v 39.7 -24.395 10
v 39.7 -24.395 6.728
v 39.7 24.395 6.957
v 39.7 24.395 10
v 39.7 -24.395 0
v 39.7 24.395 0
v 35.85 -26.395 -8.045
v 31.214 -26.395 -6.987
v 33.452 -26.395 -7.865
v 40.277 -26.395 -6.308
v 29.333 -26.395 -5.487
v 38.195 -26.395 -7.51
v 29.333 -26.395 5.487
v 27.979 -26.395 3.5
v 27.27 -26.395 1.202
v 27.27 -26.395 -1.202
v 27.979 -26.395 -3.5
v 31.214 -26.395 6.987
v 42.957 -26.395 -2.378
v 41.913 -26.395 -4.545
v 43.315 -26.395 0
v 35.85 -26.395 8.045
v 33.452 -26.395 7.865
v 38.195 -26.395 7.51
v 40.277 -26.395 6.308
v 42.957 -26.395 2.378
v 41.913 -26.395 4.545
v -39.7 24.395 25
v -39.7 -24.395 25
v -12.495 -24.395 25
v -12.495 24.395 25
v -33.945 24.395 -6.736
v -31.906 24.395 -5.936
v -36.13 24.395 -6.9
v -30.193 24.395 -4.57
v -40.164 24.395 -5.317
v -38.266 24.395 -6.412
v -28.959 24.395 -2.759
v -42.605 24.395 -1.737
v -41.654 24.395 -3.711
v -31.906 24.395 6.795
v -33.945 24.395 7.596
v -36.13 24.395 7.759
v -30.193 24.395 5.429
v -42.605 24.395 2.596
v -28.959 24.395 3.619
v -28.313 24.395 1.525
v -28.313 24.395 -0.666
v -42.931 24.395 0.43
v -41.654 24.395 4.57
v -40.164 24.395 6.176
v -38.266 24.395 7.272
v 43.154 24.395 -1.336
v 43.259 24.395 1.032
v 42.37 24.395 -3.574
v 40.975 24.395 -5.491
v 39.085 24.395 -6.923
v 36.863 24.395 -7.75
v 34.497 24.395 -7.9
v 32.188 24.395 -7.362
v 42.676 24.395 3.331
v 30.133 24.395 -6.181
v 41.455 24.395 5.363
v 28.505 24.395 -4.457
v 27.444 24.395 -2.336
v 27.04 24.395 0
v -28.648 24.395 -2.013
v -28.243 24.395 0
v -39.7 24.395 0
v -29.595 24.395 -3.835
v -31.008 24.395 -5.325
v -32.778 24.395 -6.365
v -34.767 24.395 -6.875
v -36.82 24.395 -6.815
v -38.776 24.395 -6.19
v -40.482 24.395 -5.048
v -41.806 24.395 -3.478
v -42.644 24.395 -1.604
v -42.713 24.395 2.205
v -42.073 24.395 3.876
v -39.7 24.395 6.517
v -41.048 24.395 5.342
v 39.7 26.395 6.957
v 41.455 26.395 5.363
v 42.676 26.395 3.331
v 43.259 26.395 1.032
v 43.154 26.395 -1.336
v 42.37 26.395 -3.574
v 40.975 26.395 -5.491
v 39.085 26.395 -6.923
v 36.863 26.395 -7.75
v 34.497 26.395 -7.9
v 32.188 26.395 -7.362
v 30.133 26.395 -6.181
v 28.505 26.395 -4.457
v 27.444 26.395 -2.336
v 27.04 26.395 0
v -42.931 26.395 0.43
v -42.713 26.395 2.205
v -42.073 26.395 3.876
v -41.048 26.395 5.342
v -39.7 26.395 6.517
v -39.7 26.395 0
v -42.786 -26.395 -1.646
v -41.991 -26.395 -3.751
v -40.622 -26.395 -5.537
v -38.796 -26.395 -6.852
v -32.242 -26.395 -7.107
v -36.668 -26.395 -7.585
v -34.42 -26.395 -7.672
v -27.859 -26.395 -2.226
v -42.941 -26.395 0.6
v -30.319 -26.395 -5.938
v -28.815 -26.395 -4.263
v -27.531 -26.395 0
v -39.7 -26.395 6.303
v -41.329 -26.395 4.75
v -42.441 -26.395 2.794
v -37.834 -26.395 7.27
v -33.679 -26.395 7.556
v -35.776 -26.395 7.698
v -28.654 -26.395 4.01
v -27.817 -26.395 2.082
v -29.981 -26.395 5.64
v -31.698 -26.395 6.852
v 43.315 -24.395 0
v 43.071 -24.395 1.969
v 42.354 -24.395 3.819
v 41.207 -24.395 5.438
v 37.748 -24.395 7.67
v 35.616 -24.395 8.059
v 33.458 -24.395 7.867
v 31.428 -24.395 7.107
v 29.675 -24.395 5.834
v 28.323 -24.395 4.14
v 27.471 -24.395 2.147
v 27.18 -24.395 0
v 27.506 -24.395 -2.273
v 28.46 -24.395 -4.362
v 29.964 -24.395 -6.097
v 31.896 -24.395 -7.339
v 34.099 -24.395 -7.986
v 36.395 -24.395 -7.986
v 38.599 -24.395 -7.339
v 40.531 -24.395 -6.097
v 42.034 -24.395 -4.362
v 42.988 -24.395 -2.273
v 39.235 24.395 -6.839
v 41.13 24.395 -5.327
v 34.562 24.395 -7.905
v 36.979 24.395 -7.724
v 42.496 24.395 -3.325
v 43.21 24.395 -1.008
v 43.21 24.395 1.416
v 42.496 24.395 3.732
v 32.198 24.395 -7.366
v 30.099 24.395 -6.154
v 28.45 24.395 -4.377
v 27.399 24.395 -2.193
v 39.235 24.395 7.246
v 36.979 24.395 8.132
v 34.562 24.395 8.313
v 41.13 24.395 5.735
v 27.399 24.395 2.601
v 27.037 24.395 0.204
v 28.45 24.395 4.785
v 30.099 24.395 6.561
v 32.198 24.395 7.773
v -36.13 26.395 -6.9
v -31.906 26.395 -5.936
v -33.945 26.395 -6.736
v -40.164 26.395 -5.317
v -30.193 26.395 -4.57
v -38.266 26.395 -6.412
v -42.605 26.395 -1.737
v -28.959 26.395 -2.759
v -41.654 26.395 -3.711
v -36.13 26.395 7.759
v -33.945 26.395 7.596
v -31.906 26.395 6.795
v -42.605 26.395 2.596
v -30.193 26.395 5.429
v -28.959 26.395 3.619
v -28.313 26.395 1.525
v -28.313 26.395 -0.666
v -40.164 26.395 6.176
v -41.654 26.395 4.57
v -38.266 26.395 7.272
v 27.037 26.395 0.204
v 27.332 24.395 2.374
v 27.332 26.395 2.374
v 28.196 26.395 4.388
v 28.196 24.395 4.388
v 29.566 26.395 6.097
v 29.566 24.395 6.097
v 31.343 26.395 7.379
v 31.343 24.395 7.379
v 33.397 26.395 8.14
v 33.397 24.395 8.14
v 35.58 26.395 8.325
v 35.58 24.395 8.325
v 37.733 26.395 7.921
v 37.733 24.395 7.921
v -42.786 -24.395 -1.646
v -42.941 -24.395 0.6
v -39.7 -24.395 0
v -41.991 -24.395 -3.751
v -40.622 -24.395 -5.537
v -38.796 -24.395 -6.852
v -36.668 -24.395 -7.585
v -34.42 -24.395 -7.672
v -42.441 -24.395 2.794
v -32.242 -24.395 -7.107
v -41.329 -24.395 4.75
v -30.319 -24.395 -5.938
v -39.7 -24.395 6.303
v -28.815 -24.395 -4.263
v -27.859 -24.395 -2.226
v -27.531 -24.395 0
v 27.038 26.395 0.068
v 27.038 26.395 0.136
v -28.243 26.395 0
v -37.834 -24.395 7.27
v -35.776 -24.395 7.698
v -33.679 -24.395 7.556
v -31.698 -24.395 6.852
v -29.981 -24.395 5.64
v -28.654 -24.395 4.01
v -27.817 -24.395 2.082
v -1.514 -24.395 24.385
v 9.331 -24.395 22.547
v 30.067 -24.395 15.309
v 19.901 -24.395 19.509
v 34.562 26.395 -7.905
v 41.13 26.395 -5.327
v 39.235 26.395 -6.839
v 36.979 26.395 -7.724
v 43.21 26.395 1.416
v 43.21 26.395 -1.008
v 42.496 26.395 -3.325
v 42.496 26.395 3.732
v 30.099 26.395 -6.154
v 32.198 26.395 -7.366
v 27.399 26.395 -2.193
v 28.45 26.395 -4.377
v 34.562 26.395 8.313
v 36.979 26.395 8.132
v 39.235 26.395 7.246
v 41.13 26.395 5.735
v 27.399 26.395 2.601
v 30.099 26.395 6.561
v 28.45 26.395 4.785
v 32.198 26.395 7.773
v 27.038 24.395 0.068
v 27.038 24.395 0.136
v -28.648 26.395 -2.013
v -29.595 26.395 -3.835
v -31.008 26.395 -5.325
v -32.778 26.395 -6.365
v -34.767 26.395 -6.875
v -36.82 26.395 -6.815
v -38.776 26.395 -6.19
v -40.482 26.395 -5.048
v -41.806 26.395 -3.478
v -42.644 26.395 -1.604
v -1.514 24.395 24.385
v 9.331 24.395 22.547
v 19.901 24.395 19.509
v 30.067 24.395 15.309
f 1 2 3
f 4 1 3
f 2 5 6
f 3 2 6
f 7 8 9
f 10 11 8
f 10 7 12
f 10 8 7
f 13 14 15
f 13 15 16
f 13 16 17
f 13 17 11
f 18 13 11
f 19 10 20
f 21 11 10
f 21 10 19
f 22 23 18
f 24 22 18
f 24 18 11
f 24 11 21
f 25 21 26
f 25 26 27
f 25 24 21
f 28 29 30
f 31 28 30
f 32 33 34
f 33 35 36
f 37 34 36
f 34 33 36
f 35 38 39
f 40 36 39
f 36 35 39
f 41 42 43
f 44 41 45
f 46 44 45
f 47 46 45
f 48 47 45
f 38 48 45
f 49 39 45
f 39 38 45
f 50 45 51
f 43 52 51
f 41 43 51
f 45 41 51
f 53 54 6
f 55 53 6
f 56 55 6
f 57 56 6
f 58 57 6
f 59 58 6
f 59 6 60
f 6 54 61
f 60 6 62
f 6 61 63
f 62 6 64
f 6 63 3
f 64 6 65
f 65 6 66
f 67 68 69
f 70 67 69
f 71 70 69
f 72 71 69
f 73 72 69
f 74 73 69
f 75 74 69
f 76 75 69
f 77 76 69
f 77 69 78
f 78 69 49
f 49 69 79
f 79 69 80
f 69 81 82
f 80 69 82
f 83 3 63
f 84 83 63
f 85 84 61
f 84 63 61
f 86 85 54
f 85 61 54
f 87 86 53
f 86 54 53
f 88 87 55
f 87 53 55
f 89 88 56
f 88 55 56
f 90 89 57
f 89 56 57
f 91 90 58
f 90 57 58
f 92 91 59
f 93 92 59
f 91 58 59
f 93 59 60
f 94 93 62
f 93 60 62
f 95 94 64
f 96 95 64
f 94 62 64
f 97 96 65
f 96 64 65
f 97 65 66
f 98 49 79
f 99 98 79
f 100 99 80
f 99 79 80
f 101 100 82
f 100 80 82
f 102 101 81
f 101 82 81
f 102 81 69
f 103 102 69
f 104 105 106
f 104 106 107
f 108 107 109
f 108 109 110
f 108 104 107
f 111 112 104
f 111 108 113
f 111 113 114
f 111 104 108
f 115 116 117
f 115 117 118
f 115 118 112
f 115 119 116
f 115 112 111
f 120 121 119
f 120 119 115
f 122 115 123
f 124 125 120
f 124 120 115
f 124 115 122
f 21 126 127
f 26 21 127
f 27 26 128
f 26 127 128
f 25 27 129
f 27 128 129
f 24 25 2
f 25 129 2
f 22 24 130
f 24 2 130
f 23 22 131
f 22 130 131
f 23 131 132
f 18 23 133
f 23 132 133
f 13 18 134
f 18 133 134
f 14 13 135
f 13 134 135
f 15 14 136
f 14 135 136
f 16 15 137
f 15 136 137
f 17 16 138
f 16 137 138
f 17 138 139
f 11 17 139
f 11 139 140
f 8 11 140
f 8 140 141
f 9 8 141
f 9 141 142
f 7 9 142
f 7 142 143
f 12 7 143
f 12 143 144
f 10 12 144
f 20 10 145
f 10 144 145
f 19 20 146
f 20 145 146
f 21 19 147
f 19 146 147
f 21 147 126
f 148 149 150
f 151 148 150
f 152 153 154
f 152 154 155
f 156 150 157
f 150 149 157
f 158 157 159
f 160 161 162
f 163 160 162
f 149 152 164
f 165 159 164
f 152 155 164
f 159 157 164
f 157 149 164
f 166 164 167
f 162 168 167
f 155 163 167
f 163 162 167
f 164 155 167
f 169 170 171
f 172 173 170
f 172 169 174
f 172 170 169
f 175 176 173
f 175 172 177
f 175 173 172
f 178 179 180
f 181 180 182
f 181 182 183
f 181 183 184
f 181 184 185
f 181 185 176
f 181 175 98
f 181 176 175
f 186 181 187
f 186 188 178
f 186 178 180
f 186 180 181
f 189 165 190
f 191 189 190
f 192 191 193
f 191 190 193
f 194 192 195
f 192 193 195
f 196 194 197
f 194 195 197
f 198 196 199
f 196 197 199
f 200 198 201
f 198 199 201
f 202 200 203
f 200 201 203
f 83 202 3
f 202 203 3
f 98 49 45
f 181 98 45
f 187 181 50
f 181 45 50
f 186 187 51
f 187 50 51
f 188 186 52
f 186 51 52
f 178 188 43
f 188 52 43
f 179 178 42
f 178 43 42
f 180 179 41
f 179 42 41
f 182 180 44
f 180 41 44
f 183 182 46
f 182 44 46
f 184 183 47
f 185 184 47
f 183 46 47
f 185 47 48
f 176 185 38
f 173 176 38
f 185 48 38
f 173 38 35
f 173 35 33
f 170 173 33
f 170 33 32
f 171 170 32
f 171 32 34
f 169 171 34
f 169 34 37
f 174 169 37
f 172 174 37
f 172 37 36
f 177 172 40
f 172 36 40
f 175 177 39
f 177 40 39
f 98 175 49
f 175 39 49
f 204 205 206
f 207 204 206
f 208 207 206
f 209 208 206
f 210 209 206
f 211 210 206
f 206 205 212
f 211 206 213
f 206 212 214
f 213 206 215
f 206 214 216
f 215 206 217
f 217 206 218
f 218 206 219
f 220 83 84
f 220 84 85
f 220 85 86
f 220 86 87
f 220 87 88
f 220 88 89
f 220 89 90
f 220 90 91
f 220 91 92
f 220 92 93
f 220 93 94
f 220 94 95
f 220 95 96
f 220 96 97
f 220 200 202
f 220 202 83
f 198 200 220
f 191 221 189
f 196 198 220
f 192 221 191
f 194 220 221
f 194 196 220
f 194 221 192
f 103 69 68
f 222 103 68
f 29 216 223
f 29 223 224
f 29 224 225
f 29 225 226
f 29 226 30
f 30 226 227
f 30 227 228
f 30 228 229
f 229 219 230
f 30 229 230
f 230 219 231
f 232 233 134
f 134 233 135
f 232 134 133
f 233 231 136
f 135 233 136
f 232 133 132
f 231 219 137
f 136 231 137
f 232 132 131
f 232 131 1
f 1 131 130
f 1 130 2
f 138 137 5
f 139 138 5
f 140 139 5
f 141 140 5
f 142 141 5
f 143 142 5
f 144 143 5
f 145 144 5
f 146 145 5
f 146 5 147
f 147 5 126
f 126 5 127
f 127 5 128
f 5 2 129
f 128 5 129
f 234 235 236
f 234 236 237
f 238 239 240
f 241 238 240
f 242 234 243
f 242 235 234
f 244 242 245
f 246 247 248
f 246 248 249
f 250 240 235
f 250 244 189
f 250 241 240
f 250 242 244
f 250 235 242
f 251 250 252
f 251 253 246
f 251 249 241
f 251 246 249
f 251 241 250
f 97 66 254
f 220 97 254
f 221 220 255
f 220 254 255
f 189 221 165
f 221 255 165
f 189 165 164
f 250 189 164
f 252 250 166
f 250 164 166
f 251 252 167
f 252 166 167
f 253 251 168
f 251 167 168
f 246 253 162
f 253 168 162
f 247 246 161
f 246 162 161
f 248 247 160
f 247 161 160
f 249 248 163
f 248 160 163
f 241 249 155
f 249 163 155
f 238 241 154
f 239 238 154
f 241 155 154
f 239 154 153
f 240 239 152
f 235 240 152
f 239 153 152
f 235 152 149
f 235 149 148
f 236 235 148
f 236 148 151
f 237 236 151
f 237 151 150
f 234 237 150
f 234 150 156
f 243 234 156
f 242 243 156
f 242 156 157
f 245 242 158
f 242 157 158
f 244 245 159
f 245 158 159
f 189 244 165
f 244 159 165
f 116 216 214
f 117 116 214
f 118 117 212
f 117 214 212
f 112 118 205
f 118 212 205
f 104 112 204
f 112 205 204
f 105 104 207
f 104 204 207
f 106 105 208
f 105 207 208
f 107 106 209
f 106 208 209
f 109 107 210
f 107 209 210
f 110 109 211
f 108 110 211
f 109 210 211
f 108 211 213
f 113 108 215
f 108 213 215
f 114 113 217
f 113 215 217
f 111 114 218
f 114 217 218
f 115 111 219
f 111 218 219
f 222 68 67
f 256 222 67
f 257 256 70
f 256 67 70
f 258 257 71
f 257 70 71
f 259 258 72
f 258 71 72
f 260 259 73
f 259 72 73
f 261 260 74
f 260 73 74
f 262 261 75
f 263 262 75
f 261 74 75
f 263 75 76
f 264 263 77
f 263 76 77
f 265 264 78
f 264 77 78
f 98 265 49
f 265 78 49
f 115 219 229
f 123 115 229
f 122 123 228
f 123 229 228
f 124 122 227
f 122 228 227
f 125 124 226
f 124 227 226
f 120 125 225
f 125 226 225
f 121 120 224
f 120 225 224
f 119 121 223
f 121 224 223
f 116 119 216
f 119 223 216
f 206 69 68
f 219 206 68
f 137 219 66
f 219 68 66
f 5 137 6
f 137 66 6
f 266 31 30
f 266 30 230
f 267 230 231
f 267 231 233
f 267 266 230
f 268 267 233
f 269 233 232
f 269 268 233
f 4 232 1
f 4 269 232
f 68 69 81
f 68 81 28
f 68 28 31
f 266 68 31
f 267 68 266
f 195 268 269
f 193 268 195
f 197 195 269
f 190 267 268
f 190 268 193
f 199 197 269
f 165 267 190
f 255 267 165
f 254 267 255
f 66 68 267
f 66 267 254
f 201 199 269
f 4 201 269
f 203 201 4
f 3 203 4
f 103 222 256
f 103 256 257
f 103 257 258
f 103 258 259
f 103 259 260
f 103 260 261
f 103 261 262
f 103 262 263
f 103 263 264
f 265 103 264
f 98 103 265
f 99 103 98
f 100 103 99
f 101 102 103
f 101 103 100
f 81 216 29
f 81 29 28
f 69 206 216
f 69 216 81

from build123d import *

# Parameters (mm, degrees)
F0_W         = 79.3992951512
F0_H         = 48.7897545099
F1_DEPTH     = 20
F3_DEPTH     = 2
F2_R         = 7.716624038
F2_R_2       = 8.0676554741
F4_DEPTH     = 2
F5_DEPTH     = 25
F7_DEPTH     = 2
F6_R         = 8.1319120556
F8_DEPTH     = 2
F6_R_2       = 7.3501994426
F9_SIZE      = 15
F10_T1_DEPTH = 234.764288605


# Not quite as in the source:
# - a fillet or chamfer that OpenCascade refuses, or shapes differently, is made with other operations: its cross-section is extruded or revolved along the edge and cut away or added


with BuildPart() as f1:
    # F0 (on Top) → F1 (new body)
    with BuildSketch(Plane.XY):
        Rectangle(F0_W, F0_H)
    extrude(amount=F1_DEPTH)

    # F2 (on face) → F3 (join)
    with BuildSketch(Plane.XZ.offset(24.394877255)):
        with BuildLine():
            ThreePointArc((-39.6996475756, 6.3026463031), (-38.7962669692, -6.8521156516), (-27.5307279362, 0))
            Line((-27.5307279362, 0), (-39.6996475756, 0))
            Line((-39.6996475756, 0), (-39.6996475756, 6.3026463031))
        make_face()
        with BuildLine():
            Line((-39.6996475756, 0), (-27.5307279362, 0))
            ThreePointArc((-27.5307279362, 0), (-31.6984369793, 6.8521156516), (-39.6996475756, 6.3026463031))
            Line((-39.6996475756, 6.3026463031), (-39.6996475756, 0))
        make_face()
    extrude(amount=F3_DEPTH)

    # F2 (on face) → F4 (join)
    with BuildSketch(Plane.XZ.offset(24.394877255)):
        with Locations((-35.2473519742, 0)):
            Circle(F2_R)
        with Locations((35.2473519742, 0)):
            Circle(F2_R_2)
    extrude(amount=F4_DEPTH)

    # F5 (add): a face of the model
    f5_faces = [f1.faces().sort_by_distance(p)[0] for p in [
        (0, 0, 0),
    ]]
    extrude(f5_faces, amount=-F5_DEPTH)

    # F6 (on face) → F7 (join)
    with BuildSketch(Plane(origin=(0, 24.394877255, 0), x_dir=(-1, 0, 0), z_dir=(0, 1, 0))):
        with BuildLine():
            Line((-39.6996475756, 0), (-39.6996475756, 6.9567142054))
            ThreePointArc((-39.6996475756, 6.9567142054), (-39.085462227, -6.9230727989), (-27.0398499989, 0))
            Line((-27.0398499989, 0), (-39.6996475756, 0))
        make_face()
        with BuildLine():
            ThreePointArc((-27.0398499989, 0), (-27.0379361612, 0.1018445872), (-27.0372981819, 0.2037051572))
            ThreePointArc((-27.0372981819, 0.2037051572), (-31.3425357234, 7.3789790783), (-39.6996475756, 6.9567142054))
            Line((-39.6996475756, 6.9567142054), (-39.6996475756, 0))
            Line((-39.6996475756, 0), (-27.0398499989, 0))
        make_face()
        with BuildLine():
            Line((39.6996475756, 0), (28.2432777683, 0))
            ThreePointArc((28.2432777683, 0), (35.7958396069, -6.9173753491), (42.9311066746, 0.4296809267))
            ThreePointArc((42.9311066746, 0.4296809267), (42.0731716607, 3.875828694), (39.6996475756, 6.517489221))
            Line((39.6996475756, 6.517489221), (39.6996475756, 0))
        make_face()
    extrude(amount=F7_DEPTH)

    # F9
    f9_edges = [f1.edges().sort_by_distance(p)[0] for p in [
        (39.699648, 0, 25),
    ]]
    chamfer(f9_edges, length=F9_SIZE)

    # F10: fillet of radius 98.3102765948 on 1 edges, made by hand

    # F10_s2 → F10_t1 (cut)
    with BuildSketch(Plane.XZ.offset(-117.3821443025)):
        with BuildLine():
            ThreePointArc((-12.4952592434, 25), (14.6585079807, 21.1756134083), (39.6996475756, 10))
            Line((39.6996475756, 10), (24.6996475756, 25))
            Line((24.6996475756, 25), (-12.4952592434, 25))
        make_face()
    extrude(amount=F10_T1_DEPTH, mode=Mode.SUBTRACT)


with BuildPart() as f8:
    # F6 (on face) → F8 (new body)
    with BuildSketch(Plane(origin=(0, 24.394877255, 0), x_dir=(-1, 0, 0), z_dir=(0, 1, 0))):
        with Locations((-35.1692102375, 0.2037051572)):
            Circle(F6_R)
    extrude(amount=F8_DEPTH)


with BuildPart() as f8b:
    # F6 (on face) → F8, piece 2 (new body)
    with BuildSketch(Plane(origin=(0, 24.394877255, 0), x_dir=(-1, 0, 0), z_dir=(0, 1, 0))):
        with Locations((35.580907232, 0.4296809267)):
            Circle(F6_R_2)
    extrude(amount=F8_DEPTH)


solid = Compound([f1.part, f8.part, f8b.part])
